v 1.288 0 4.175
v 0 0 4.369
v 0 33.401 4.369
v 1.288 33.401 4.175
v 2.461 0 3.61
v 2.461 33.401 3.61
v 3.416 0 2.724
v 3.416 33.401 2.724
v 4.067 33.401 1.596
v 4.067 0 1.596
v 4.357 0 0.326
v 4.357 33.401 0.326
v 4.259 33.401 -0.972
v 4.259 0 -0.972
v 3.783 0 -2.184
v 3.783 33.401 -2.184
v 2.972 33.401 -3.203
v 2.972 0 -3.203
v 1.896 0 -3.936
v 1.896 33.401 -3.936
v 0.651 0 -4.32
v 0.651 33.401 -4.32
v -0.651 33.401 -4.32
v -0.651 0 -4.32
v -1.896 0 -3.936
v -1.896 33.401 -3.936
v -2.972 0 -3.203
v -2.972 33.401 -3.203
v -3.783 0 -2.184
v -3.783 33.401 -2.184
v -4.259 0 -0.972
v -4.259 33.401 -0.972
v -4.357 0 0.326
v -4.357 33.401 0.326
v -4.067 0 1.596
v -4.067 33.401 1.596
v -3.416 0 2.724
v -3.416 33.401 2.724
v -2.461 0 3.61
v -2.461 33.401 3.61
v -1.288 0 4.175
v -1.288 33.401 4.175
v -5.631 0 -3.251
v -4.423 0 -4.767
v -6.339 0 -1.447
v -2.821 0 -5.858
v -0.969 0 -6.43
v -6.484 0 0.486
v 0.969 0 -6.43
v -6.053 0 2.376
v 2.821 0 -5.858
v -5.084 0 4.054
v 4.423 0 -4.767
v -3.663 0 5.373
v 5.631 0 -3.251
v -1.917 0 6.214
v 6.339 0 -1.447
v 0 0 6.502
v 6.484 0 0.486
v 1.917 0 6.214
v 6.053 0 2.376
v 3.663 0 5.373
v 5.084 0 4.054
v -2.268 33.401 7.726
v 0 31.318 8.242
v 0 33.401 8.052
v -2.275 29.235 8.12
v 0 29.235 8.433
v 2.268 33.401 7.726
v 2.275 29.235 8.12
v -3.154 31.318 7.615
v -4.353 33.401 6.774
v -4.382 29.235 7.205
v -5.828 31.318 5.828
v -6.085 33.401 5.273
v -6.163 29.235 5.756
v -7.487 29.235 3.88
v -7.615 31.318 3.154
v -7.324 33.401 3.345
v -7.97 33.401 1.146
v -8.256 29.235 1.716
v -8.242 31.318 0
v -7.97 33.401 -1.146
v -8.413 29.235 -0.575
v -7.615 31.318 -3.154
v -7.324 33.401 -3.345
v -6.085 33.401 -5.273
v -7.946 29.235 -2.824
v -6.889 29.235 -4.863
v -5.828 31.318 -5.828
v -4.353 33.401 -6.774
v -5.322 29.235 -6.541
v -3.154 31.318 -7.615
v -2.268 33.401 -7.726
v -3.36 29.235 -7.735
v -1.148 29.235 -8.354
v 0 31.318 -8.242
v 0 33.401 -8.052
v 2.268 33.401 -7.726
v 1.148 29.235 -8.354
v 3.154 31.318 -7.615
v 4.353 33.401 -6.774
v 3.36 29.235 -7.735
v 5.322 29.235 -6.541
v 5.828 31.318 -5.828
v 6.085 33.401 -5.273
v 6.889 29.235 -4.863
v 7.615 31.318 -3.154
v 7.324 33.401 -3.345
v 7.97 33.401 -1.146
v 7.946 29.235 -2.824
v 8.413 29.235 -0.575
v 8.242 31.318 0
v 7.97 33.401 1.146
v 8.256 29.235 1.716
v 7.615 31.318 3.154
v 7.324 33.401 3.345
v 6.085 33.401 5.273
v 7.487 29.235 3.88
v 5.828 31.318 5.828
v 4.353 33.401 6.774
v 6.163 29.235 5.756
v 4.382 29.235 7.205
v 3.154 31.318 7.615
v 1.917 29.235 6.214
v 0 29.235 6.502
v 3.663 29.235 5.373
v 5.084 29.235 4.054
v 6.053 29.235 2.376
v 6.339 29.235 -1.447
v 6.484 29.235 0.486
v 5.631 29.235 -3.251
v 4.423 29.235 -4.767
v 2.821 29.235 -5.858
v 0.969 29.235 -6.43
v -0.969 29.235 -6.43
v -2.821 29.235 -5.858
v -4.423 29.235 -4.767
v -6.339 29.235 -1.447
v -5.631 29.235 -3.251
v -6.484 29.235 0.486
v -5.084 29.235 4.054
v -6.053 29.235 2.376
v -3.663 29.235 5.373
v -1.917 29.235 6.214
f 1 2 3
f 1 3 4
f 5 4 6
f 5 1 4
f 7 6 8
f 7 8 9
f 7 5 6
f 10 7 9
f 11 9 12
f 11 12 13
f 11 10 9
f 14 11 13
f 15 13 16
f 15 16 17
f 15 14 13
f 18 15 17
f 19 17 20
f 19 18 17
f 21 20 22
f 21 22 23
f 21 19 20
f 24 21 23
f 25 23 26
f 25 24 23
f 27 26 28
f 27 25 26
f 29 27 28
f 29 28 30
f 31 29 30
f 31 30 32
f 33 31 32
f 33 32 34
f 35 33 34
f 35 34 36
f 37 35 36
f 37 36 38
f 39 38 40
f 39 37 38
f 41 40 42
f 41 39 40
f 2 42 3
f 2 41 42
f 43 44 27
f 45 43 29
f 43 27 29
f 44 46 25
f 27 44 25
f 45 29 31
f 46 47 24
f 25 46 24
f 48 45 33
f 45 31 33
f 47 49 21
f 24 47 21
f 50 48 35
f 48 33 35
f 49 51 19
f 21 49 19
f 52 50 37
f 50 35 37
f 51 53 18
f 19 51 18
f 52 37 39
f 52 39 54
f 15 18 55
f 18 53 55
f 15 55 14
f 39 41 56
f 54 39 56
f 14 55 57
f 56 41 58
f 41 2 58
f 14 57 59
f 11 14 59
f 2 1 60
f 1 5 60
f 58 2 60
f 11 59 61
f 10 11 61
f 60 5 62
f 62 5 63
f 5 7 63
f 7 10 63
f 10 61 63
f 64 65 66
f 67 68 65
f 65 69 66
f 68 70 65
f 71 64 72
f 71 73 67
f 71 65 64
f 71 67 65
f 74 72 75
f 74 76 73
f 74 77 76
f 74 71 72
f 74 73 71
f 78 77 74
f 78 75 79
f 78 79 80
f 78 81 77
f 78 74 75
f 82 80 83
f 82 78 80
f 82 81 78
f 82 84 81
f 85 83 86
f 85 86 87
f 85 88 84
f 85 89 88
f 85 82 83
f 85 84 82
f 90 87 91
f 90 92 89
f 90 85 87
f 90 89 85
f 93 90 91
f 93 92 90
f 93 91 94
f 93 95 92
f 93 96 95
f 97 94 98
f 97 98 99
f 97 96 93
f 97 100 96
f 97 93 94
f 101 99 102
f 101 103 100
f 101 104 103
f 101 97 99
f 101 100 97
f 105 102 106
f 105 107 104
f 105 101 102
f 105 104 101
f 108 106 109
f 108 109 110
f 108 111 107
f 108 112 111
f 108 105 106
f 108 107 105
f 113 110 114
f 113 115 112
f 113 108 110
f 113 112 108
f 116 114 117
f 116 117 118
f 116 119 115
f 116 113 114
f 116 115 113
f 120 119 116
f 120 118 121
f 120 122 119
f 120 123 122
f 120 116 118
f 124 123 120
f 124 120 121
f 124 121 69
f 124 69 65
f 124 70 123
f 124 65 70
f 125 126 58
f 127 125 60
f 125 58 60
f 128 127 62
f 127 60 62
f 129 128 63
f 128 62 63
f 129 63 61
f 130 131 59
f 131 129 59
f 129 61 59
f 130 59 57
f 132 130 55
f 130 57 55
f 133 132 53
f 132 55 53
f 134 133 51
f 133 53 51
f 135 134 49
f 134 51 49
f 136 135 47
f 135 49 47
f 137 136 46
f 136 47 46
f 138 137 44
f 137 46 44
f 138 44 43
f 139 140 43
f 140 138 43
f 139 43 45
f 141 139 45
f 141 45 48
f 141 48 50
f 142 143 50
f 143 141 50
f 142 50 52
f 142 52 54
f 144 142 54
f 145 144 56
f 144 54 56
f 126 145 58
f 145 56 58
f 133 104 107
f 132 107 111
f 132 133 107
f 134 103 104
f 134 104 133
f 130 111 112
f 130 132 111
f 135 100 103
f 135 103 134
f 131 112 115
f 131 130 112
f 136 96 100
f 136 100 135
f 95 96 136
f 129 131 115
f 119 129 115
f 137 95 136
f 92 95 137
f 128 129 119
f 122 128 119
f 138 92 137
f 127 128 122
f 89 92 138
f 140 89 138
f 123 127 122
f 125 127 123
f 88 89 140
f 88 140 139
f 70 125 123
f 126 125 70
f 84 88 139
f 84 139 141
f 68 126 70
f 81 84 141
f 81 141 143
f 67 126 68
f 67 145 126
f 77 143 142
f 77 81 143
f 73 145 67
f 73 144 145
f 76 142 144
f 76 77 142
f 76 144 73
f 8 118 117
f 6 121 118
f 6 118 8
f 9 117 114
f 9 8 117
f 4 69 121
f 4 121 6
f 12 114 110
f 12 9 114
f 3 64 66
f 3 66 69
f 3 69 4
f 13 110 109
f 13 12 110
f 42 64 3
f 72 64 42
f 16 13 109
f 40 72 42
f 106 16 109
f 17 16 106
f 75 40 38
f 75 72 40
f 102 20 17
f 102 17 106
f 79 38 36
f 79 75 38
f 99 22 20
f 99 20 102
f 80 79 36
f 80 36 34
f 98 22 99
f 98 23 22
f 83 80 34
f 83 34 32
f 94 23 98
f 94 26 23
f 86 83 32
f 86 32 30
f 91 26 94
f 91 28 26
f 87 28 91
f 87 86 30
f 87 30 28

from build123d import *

# Parameters (mm, degrees)
SKETCH1_R           = 6.5024
BOSS_EXTRUDE1_DEPTH = 33.401
SKETCH2_R           = 4.3688
CUT_EXTRUDE1_DEPTH  = 33.401


with BuildPart() as part:
    # Sketch1 → Boss-Extrude1 (new body)
    with BuildSketch(Plane(origin=(0, 0, 0), x_dir=(1, 0, 0), z_dir=(0, 1, 0))):
        with Locations(Location((0, 0, 0), (0, 0, 270))):
            Circle(SKETCH1_R)
    extrude(amount=BOSS_EXTRUDE1_DEPTH)

    # Sketch2 → Cut-Extrude1 (cut)
    with BuildSketch(Plane(origin=(0, 0, 0), x_dir=(1, 0, 0), z_dir=(0, 1, 0))):
        with Locations(Location((0, 0, 0), (0, 0, 270))):
            Circle(SKETCH2_R)
    extrude(amount=CUT_EXTRUDE1_DEPTH, mode=Mode.SUBTRACT)

    # Sketch3 → Revolve2 (revolve)
    with BuildSketch(Plane.XY, mode=Mode.PRIVATE) as revolve2_sk:
        Polygon((6.5024, 33.401), (8.0518, 33.401), (8.4328, 29.2354), (6.5024, 29.2354), align=None)
    revolve(revolve2_sk.sketch.rotate(Axis((0, 33.401, 0), (0, -1, 0)), 90), axis=Axis((0, 33.401, 0), (0, -1, 0)))


solid = part.part
